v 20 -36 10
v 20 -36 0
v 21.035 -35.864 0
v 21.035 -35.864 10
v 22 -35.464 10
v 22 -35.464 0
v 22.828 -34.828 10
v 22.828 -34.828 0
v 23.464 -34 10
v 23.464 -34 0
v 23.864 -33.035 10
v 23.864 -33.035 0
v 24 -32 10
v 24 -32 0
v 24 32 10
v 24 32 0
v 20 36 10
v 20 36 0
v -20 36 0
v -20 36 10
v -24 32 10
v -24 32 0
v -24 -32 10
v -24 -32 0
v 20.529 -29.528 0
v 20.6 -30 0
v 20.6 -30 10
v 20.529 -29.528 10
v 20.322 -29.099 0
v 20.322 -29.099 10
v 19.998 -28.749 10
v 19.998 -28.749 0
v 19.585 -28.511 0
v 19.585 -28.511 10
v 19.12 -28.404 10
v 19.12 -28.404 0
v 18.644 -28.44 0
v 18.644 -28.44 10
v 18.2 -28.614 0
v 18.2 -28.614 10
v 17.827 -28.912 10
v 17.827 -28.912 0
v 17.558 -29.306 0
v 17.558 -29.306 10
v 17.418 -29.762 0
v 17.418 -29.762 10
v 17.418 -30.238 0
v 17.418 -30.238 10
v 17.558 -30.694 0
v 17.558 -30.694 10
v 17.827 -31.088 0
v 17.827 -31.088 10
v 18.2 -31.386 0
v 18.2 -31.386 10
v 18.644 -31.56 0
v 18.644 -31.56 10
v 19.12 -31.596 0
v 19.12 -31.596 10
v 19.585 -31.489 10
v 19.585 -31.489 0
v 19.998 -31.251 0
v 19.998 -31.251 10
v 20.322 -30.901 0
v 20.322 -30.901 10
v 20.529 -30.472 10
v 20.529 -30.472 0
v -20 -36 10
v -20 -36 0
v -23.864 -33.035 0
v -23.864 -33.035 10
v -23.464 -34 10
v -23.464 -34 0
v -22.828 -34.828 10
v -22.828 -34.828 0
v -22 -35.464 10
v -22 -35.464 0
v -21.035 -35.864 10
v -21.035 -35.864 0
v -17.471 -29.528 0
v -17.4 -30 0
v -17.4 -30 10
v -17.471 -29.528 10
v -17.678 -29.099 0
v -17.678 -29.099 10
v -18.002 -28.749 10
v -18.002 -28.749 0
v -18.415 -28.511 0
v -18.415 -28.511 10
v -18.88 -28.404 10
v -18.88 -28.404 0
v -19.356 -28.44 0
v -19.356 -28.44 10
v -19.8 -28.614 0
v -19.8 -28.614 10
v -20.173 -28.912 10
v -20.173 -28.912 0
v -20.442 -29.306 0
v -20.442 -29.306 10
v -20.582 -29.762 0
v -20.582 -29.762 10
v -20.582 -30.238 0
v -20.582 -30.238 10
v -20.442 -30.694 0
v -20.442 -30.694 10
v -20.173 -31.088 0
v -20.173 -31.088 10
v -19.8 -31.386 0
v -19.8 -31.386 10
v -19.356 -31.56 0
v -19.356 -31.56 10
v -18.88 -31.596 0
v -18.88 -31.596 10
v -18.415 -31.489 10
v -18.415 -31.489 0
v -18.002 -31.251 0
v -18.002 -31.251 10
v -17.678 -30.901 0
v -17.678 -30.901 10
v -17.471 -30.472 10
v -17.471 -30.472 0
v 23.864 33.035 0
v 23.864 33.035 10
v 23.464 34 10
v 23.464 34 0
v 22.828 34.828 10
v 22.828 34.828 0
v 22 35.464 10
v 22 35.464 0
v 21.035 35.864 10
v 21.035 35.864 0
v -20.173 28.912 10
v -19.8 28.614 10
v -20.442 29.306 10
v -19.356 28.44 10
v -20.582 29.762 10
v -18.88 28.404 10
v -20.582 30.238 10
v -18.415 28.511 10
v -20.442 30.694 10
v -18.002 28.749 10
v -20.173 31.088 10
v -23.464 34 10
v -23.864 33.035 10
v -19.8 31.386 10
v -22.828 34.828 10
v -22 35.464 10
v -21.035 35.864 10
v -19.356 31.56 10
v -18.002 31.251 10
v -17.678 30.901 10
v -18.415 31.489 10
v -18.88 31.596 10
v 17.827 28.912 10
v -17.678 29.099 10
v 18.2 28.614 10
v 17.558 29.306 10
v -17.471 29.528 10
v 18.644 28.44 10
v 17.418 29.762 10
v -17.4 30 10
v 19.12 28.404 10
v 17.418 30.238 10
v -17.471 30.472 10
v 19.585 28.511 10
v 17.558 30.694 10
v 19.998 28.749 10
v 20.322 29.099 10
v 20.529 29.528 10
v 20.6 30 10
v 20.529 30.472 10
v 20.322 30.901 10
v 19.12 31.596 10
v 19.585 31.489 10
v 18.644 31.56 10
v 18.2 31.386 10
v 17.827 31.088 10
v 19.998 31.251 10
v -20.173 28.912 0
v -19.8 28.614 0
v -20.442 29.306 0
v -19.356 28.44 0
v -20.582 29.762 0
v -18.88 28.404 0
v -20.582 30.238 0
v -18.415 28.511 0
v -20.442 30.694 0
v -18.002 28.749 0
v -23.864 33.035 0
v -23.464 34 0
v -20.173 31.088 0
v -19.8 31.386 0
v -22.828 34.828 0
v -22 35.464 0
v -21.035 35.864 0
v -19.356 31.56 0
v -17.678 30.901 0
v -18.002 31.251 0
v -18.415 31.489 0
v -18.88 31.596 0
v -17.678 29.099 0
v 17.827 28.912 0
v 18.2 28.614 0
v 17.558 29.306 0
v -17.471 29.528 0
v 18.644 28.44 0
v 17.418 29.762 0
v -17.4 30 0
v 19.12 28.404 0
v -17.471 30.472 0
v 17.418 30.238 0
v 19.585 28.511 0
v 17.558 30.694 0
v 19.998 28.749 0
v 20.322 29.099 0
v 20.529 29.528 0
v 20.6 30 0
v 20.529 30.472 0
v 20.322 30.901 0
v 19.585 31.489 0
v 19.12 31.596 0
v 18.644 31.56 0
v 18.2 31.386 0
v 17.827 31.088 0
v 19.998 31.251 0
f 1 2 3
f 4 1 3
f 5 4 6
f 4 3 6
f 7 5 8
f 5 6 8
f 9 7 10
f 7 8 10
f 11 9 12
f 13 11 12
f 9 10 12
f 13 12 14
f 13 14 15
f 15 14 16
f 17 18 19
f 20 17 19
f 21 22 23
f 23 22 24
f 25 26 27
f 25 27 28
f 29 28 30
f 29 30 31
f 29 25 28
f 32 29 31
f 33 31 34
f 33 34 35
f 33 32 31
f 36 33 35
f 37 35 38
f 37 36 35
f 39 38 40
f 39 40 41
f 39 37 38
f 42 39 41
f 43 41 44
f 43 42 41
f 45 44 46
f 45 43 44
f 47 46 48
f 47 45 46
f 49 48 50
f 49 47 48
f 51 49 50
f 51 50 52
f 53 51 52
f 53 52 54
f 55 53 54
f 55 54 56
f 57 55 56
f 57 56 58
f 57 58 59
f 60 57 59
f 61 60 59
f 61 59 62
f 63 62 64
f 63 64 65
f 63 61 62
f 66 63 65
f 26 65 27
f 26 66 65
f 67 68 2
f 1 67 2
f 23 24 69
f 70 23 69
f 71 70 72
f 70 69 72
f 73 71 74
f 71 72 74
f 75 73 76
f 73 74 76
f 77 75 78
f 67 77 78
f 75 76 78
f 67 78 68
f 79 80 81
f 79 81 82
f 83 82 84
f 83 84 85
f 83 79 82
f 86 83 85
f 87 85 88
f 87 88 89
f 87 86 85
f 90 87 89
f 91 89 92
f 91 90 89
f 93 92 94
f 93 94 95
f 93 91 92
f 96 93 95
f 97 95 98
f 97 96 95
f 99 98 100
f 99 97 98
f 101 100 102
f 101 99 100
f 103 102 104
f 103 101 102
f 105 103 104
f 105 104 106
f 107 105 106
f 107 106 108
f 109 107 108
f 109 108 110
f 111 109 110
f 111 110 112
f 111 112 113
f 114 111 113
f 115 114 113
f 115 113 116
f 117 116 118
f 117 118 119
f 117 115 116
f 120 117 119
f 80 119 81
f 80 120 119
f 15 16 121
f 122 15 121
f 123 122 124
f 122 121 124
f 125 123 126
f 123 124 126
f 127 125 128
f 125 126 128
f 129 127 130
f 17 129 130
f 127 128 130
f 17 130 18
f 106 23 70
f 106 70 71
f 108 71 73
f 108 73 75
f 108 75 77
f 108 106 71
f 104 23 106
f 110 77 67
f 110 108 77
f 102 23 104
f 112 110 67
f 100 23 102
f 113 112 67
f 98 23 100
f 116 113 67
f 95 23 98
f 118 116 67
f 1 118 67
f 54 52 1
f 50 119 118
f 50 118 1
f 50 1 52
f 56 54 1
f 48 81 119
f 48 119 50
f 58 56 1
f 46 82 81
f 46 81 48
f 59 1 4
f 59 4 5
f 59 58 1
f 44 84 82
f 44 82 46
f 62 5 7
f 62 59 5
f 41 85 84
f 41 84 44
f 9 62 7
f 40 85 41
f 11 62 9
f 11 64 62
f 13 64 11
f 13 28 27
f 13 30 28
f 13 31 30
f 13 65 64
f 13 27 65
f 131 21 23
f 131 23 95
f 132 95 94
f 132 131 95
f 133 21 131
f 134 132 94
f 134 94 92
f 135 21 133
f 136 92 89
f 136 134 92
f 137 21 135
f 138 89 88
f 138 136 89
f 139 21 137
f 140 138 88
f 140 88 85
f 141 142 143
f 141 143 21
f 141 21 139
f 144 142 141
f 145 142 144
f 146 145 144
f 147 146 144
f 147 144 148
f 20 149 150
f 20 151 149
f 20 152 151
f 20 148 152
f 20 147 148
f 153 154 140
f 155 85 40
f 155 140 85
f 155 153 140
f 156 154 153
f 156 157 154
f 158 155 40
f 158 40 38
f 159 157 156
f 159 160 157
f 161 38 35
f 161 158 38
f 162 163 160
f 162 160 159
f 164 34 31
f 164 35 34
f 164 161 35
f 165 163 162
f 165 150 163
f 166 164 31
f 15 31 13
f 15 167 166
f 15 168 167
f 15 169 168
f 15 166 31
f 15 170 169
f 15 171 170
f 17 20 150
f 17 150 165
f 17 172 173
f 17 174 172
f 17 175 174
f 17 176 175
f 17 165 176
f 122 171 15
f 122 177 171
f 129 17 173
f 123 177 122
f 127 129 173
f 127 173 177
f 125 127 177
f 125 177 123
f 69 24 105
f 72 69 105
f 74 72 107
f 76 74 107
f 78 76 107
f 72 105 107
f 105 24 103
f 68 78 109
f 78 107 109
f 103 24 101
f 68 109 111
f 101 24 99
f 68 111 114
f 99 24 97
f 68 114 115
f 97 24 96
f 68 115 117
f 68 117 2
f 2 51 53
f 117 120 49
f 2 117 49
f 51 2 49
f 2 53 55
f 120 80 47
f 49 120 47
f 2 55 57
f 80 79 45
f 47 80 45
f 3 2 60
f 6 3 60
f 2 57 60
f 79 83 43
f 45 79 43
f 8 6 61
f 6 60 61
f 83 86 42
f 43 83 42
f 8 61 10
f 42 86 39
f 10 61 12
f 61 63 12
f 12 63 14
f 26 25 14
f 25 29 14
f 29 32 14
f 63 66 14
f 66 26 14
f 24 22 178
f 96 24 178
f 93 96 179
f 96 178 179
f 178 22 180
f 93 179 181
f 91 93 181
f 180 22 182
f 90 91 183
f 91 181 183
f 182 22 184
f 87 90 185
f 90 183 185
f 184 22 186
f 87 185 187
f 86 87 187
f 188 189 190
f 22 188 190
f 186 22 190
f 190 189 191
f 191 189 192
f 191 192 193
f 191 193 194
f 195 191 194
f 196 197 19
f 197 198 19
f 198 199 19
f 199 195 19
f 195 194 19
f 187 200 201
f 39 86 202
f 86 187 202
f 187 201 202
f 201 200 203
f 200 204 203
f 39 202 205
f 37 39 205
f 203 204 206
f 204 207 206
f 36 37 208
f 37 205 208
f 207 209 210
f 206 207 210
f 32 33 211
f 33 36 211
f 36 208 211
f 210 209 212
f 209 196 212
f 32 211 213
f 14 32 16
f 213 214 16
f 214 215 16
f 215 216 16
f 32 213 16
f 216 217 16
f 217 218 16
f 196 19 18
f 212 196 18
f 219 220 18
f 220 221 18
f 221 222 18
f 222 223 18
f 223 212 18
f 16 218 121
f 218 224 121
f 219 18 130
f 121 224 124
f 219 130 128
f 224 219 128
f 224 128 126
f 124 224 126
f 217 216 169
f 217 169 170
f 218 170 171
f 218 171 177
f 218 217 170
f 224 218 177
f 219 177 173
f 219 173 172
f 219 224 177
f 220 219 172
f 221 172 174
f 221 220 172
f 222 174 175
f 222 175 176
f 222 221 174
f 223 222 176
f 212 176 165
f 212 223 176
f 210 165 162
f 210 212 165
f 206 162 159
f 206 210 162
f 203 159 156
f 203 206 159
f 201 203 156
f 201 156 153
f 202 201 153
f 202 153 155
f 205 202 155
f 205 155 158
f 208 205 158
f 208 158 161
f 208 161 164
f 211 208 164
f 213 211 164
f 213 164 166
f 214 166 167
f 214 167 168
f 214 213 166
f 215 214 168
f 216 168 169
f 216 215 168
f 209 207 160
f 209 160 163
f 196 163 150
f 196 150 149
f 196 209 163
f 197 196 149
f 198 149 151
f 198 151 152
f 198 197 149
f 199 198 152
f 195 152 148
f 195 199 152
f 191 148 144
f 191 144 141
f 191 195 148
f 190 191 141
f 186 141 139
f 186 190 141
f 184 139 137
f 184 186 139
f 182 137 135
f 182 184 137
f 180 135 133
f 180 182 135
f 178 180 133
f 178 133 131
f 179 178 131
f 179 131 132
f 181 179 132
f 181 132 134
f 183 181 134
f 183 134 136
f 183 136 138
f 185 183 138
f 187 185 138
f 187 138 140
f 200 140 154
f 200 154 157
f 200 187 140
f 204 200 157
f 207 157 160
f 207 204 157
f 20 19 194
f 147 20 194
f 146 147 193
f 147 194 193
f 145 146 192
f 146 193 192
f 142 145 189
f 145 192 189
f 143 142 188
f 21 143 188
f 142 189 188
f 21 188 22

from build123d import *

# Parameters (mm, degrees)
F0_R     = 1.6
F1_DEPTH = 10


with BuildPart() as f1:
    # F0 (on Top) → F1 (new body)
    with BuildSketch(Plane.XY):
        with BuildLine():
            Line((20, 36), (0, 36))
            Line((0, 36), (-20, 36))
            ThreePointArc((-20, 36), (-22.828427, 34.828427), (-24, 32))
            Line((-24, 32), (-24, 0))
            Line((-24, 0), (-24, -32))
            ThreePointArc((-24, -32), (-22.828427, -34.828427), (-20, -36))
            Line((-20, -36), (0, -36))
            Line((0, -36), (20, -36))
            ThreePointArc((20, -36), (22.828427, -34.828427), (24, -32))
            Line((24, -32), (24, 0))
            Line((24, 0), (24, 32))
            ThreePointArc((24, 32), (22.828427, 34.828427), (20, 36))
        make_face()
        with Locations((-19, -30)):
            Circle(F0_R, mode=Mode.SUBTRACT)
        with Locations((19, -30)):
            Circle(F0_R, mode=Mode.SUBTRACT)
        with Locations((-19, 30)):
            Circle(F0_R, mode=Mode.SUBTRACT)
        with Locations((19, 30)):
            Circle(F0_R, mode=Mode.SUBTRACT)
    extrude(amount=F1_DEPTH)


solid = f1.part
